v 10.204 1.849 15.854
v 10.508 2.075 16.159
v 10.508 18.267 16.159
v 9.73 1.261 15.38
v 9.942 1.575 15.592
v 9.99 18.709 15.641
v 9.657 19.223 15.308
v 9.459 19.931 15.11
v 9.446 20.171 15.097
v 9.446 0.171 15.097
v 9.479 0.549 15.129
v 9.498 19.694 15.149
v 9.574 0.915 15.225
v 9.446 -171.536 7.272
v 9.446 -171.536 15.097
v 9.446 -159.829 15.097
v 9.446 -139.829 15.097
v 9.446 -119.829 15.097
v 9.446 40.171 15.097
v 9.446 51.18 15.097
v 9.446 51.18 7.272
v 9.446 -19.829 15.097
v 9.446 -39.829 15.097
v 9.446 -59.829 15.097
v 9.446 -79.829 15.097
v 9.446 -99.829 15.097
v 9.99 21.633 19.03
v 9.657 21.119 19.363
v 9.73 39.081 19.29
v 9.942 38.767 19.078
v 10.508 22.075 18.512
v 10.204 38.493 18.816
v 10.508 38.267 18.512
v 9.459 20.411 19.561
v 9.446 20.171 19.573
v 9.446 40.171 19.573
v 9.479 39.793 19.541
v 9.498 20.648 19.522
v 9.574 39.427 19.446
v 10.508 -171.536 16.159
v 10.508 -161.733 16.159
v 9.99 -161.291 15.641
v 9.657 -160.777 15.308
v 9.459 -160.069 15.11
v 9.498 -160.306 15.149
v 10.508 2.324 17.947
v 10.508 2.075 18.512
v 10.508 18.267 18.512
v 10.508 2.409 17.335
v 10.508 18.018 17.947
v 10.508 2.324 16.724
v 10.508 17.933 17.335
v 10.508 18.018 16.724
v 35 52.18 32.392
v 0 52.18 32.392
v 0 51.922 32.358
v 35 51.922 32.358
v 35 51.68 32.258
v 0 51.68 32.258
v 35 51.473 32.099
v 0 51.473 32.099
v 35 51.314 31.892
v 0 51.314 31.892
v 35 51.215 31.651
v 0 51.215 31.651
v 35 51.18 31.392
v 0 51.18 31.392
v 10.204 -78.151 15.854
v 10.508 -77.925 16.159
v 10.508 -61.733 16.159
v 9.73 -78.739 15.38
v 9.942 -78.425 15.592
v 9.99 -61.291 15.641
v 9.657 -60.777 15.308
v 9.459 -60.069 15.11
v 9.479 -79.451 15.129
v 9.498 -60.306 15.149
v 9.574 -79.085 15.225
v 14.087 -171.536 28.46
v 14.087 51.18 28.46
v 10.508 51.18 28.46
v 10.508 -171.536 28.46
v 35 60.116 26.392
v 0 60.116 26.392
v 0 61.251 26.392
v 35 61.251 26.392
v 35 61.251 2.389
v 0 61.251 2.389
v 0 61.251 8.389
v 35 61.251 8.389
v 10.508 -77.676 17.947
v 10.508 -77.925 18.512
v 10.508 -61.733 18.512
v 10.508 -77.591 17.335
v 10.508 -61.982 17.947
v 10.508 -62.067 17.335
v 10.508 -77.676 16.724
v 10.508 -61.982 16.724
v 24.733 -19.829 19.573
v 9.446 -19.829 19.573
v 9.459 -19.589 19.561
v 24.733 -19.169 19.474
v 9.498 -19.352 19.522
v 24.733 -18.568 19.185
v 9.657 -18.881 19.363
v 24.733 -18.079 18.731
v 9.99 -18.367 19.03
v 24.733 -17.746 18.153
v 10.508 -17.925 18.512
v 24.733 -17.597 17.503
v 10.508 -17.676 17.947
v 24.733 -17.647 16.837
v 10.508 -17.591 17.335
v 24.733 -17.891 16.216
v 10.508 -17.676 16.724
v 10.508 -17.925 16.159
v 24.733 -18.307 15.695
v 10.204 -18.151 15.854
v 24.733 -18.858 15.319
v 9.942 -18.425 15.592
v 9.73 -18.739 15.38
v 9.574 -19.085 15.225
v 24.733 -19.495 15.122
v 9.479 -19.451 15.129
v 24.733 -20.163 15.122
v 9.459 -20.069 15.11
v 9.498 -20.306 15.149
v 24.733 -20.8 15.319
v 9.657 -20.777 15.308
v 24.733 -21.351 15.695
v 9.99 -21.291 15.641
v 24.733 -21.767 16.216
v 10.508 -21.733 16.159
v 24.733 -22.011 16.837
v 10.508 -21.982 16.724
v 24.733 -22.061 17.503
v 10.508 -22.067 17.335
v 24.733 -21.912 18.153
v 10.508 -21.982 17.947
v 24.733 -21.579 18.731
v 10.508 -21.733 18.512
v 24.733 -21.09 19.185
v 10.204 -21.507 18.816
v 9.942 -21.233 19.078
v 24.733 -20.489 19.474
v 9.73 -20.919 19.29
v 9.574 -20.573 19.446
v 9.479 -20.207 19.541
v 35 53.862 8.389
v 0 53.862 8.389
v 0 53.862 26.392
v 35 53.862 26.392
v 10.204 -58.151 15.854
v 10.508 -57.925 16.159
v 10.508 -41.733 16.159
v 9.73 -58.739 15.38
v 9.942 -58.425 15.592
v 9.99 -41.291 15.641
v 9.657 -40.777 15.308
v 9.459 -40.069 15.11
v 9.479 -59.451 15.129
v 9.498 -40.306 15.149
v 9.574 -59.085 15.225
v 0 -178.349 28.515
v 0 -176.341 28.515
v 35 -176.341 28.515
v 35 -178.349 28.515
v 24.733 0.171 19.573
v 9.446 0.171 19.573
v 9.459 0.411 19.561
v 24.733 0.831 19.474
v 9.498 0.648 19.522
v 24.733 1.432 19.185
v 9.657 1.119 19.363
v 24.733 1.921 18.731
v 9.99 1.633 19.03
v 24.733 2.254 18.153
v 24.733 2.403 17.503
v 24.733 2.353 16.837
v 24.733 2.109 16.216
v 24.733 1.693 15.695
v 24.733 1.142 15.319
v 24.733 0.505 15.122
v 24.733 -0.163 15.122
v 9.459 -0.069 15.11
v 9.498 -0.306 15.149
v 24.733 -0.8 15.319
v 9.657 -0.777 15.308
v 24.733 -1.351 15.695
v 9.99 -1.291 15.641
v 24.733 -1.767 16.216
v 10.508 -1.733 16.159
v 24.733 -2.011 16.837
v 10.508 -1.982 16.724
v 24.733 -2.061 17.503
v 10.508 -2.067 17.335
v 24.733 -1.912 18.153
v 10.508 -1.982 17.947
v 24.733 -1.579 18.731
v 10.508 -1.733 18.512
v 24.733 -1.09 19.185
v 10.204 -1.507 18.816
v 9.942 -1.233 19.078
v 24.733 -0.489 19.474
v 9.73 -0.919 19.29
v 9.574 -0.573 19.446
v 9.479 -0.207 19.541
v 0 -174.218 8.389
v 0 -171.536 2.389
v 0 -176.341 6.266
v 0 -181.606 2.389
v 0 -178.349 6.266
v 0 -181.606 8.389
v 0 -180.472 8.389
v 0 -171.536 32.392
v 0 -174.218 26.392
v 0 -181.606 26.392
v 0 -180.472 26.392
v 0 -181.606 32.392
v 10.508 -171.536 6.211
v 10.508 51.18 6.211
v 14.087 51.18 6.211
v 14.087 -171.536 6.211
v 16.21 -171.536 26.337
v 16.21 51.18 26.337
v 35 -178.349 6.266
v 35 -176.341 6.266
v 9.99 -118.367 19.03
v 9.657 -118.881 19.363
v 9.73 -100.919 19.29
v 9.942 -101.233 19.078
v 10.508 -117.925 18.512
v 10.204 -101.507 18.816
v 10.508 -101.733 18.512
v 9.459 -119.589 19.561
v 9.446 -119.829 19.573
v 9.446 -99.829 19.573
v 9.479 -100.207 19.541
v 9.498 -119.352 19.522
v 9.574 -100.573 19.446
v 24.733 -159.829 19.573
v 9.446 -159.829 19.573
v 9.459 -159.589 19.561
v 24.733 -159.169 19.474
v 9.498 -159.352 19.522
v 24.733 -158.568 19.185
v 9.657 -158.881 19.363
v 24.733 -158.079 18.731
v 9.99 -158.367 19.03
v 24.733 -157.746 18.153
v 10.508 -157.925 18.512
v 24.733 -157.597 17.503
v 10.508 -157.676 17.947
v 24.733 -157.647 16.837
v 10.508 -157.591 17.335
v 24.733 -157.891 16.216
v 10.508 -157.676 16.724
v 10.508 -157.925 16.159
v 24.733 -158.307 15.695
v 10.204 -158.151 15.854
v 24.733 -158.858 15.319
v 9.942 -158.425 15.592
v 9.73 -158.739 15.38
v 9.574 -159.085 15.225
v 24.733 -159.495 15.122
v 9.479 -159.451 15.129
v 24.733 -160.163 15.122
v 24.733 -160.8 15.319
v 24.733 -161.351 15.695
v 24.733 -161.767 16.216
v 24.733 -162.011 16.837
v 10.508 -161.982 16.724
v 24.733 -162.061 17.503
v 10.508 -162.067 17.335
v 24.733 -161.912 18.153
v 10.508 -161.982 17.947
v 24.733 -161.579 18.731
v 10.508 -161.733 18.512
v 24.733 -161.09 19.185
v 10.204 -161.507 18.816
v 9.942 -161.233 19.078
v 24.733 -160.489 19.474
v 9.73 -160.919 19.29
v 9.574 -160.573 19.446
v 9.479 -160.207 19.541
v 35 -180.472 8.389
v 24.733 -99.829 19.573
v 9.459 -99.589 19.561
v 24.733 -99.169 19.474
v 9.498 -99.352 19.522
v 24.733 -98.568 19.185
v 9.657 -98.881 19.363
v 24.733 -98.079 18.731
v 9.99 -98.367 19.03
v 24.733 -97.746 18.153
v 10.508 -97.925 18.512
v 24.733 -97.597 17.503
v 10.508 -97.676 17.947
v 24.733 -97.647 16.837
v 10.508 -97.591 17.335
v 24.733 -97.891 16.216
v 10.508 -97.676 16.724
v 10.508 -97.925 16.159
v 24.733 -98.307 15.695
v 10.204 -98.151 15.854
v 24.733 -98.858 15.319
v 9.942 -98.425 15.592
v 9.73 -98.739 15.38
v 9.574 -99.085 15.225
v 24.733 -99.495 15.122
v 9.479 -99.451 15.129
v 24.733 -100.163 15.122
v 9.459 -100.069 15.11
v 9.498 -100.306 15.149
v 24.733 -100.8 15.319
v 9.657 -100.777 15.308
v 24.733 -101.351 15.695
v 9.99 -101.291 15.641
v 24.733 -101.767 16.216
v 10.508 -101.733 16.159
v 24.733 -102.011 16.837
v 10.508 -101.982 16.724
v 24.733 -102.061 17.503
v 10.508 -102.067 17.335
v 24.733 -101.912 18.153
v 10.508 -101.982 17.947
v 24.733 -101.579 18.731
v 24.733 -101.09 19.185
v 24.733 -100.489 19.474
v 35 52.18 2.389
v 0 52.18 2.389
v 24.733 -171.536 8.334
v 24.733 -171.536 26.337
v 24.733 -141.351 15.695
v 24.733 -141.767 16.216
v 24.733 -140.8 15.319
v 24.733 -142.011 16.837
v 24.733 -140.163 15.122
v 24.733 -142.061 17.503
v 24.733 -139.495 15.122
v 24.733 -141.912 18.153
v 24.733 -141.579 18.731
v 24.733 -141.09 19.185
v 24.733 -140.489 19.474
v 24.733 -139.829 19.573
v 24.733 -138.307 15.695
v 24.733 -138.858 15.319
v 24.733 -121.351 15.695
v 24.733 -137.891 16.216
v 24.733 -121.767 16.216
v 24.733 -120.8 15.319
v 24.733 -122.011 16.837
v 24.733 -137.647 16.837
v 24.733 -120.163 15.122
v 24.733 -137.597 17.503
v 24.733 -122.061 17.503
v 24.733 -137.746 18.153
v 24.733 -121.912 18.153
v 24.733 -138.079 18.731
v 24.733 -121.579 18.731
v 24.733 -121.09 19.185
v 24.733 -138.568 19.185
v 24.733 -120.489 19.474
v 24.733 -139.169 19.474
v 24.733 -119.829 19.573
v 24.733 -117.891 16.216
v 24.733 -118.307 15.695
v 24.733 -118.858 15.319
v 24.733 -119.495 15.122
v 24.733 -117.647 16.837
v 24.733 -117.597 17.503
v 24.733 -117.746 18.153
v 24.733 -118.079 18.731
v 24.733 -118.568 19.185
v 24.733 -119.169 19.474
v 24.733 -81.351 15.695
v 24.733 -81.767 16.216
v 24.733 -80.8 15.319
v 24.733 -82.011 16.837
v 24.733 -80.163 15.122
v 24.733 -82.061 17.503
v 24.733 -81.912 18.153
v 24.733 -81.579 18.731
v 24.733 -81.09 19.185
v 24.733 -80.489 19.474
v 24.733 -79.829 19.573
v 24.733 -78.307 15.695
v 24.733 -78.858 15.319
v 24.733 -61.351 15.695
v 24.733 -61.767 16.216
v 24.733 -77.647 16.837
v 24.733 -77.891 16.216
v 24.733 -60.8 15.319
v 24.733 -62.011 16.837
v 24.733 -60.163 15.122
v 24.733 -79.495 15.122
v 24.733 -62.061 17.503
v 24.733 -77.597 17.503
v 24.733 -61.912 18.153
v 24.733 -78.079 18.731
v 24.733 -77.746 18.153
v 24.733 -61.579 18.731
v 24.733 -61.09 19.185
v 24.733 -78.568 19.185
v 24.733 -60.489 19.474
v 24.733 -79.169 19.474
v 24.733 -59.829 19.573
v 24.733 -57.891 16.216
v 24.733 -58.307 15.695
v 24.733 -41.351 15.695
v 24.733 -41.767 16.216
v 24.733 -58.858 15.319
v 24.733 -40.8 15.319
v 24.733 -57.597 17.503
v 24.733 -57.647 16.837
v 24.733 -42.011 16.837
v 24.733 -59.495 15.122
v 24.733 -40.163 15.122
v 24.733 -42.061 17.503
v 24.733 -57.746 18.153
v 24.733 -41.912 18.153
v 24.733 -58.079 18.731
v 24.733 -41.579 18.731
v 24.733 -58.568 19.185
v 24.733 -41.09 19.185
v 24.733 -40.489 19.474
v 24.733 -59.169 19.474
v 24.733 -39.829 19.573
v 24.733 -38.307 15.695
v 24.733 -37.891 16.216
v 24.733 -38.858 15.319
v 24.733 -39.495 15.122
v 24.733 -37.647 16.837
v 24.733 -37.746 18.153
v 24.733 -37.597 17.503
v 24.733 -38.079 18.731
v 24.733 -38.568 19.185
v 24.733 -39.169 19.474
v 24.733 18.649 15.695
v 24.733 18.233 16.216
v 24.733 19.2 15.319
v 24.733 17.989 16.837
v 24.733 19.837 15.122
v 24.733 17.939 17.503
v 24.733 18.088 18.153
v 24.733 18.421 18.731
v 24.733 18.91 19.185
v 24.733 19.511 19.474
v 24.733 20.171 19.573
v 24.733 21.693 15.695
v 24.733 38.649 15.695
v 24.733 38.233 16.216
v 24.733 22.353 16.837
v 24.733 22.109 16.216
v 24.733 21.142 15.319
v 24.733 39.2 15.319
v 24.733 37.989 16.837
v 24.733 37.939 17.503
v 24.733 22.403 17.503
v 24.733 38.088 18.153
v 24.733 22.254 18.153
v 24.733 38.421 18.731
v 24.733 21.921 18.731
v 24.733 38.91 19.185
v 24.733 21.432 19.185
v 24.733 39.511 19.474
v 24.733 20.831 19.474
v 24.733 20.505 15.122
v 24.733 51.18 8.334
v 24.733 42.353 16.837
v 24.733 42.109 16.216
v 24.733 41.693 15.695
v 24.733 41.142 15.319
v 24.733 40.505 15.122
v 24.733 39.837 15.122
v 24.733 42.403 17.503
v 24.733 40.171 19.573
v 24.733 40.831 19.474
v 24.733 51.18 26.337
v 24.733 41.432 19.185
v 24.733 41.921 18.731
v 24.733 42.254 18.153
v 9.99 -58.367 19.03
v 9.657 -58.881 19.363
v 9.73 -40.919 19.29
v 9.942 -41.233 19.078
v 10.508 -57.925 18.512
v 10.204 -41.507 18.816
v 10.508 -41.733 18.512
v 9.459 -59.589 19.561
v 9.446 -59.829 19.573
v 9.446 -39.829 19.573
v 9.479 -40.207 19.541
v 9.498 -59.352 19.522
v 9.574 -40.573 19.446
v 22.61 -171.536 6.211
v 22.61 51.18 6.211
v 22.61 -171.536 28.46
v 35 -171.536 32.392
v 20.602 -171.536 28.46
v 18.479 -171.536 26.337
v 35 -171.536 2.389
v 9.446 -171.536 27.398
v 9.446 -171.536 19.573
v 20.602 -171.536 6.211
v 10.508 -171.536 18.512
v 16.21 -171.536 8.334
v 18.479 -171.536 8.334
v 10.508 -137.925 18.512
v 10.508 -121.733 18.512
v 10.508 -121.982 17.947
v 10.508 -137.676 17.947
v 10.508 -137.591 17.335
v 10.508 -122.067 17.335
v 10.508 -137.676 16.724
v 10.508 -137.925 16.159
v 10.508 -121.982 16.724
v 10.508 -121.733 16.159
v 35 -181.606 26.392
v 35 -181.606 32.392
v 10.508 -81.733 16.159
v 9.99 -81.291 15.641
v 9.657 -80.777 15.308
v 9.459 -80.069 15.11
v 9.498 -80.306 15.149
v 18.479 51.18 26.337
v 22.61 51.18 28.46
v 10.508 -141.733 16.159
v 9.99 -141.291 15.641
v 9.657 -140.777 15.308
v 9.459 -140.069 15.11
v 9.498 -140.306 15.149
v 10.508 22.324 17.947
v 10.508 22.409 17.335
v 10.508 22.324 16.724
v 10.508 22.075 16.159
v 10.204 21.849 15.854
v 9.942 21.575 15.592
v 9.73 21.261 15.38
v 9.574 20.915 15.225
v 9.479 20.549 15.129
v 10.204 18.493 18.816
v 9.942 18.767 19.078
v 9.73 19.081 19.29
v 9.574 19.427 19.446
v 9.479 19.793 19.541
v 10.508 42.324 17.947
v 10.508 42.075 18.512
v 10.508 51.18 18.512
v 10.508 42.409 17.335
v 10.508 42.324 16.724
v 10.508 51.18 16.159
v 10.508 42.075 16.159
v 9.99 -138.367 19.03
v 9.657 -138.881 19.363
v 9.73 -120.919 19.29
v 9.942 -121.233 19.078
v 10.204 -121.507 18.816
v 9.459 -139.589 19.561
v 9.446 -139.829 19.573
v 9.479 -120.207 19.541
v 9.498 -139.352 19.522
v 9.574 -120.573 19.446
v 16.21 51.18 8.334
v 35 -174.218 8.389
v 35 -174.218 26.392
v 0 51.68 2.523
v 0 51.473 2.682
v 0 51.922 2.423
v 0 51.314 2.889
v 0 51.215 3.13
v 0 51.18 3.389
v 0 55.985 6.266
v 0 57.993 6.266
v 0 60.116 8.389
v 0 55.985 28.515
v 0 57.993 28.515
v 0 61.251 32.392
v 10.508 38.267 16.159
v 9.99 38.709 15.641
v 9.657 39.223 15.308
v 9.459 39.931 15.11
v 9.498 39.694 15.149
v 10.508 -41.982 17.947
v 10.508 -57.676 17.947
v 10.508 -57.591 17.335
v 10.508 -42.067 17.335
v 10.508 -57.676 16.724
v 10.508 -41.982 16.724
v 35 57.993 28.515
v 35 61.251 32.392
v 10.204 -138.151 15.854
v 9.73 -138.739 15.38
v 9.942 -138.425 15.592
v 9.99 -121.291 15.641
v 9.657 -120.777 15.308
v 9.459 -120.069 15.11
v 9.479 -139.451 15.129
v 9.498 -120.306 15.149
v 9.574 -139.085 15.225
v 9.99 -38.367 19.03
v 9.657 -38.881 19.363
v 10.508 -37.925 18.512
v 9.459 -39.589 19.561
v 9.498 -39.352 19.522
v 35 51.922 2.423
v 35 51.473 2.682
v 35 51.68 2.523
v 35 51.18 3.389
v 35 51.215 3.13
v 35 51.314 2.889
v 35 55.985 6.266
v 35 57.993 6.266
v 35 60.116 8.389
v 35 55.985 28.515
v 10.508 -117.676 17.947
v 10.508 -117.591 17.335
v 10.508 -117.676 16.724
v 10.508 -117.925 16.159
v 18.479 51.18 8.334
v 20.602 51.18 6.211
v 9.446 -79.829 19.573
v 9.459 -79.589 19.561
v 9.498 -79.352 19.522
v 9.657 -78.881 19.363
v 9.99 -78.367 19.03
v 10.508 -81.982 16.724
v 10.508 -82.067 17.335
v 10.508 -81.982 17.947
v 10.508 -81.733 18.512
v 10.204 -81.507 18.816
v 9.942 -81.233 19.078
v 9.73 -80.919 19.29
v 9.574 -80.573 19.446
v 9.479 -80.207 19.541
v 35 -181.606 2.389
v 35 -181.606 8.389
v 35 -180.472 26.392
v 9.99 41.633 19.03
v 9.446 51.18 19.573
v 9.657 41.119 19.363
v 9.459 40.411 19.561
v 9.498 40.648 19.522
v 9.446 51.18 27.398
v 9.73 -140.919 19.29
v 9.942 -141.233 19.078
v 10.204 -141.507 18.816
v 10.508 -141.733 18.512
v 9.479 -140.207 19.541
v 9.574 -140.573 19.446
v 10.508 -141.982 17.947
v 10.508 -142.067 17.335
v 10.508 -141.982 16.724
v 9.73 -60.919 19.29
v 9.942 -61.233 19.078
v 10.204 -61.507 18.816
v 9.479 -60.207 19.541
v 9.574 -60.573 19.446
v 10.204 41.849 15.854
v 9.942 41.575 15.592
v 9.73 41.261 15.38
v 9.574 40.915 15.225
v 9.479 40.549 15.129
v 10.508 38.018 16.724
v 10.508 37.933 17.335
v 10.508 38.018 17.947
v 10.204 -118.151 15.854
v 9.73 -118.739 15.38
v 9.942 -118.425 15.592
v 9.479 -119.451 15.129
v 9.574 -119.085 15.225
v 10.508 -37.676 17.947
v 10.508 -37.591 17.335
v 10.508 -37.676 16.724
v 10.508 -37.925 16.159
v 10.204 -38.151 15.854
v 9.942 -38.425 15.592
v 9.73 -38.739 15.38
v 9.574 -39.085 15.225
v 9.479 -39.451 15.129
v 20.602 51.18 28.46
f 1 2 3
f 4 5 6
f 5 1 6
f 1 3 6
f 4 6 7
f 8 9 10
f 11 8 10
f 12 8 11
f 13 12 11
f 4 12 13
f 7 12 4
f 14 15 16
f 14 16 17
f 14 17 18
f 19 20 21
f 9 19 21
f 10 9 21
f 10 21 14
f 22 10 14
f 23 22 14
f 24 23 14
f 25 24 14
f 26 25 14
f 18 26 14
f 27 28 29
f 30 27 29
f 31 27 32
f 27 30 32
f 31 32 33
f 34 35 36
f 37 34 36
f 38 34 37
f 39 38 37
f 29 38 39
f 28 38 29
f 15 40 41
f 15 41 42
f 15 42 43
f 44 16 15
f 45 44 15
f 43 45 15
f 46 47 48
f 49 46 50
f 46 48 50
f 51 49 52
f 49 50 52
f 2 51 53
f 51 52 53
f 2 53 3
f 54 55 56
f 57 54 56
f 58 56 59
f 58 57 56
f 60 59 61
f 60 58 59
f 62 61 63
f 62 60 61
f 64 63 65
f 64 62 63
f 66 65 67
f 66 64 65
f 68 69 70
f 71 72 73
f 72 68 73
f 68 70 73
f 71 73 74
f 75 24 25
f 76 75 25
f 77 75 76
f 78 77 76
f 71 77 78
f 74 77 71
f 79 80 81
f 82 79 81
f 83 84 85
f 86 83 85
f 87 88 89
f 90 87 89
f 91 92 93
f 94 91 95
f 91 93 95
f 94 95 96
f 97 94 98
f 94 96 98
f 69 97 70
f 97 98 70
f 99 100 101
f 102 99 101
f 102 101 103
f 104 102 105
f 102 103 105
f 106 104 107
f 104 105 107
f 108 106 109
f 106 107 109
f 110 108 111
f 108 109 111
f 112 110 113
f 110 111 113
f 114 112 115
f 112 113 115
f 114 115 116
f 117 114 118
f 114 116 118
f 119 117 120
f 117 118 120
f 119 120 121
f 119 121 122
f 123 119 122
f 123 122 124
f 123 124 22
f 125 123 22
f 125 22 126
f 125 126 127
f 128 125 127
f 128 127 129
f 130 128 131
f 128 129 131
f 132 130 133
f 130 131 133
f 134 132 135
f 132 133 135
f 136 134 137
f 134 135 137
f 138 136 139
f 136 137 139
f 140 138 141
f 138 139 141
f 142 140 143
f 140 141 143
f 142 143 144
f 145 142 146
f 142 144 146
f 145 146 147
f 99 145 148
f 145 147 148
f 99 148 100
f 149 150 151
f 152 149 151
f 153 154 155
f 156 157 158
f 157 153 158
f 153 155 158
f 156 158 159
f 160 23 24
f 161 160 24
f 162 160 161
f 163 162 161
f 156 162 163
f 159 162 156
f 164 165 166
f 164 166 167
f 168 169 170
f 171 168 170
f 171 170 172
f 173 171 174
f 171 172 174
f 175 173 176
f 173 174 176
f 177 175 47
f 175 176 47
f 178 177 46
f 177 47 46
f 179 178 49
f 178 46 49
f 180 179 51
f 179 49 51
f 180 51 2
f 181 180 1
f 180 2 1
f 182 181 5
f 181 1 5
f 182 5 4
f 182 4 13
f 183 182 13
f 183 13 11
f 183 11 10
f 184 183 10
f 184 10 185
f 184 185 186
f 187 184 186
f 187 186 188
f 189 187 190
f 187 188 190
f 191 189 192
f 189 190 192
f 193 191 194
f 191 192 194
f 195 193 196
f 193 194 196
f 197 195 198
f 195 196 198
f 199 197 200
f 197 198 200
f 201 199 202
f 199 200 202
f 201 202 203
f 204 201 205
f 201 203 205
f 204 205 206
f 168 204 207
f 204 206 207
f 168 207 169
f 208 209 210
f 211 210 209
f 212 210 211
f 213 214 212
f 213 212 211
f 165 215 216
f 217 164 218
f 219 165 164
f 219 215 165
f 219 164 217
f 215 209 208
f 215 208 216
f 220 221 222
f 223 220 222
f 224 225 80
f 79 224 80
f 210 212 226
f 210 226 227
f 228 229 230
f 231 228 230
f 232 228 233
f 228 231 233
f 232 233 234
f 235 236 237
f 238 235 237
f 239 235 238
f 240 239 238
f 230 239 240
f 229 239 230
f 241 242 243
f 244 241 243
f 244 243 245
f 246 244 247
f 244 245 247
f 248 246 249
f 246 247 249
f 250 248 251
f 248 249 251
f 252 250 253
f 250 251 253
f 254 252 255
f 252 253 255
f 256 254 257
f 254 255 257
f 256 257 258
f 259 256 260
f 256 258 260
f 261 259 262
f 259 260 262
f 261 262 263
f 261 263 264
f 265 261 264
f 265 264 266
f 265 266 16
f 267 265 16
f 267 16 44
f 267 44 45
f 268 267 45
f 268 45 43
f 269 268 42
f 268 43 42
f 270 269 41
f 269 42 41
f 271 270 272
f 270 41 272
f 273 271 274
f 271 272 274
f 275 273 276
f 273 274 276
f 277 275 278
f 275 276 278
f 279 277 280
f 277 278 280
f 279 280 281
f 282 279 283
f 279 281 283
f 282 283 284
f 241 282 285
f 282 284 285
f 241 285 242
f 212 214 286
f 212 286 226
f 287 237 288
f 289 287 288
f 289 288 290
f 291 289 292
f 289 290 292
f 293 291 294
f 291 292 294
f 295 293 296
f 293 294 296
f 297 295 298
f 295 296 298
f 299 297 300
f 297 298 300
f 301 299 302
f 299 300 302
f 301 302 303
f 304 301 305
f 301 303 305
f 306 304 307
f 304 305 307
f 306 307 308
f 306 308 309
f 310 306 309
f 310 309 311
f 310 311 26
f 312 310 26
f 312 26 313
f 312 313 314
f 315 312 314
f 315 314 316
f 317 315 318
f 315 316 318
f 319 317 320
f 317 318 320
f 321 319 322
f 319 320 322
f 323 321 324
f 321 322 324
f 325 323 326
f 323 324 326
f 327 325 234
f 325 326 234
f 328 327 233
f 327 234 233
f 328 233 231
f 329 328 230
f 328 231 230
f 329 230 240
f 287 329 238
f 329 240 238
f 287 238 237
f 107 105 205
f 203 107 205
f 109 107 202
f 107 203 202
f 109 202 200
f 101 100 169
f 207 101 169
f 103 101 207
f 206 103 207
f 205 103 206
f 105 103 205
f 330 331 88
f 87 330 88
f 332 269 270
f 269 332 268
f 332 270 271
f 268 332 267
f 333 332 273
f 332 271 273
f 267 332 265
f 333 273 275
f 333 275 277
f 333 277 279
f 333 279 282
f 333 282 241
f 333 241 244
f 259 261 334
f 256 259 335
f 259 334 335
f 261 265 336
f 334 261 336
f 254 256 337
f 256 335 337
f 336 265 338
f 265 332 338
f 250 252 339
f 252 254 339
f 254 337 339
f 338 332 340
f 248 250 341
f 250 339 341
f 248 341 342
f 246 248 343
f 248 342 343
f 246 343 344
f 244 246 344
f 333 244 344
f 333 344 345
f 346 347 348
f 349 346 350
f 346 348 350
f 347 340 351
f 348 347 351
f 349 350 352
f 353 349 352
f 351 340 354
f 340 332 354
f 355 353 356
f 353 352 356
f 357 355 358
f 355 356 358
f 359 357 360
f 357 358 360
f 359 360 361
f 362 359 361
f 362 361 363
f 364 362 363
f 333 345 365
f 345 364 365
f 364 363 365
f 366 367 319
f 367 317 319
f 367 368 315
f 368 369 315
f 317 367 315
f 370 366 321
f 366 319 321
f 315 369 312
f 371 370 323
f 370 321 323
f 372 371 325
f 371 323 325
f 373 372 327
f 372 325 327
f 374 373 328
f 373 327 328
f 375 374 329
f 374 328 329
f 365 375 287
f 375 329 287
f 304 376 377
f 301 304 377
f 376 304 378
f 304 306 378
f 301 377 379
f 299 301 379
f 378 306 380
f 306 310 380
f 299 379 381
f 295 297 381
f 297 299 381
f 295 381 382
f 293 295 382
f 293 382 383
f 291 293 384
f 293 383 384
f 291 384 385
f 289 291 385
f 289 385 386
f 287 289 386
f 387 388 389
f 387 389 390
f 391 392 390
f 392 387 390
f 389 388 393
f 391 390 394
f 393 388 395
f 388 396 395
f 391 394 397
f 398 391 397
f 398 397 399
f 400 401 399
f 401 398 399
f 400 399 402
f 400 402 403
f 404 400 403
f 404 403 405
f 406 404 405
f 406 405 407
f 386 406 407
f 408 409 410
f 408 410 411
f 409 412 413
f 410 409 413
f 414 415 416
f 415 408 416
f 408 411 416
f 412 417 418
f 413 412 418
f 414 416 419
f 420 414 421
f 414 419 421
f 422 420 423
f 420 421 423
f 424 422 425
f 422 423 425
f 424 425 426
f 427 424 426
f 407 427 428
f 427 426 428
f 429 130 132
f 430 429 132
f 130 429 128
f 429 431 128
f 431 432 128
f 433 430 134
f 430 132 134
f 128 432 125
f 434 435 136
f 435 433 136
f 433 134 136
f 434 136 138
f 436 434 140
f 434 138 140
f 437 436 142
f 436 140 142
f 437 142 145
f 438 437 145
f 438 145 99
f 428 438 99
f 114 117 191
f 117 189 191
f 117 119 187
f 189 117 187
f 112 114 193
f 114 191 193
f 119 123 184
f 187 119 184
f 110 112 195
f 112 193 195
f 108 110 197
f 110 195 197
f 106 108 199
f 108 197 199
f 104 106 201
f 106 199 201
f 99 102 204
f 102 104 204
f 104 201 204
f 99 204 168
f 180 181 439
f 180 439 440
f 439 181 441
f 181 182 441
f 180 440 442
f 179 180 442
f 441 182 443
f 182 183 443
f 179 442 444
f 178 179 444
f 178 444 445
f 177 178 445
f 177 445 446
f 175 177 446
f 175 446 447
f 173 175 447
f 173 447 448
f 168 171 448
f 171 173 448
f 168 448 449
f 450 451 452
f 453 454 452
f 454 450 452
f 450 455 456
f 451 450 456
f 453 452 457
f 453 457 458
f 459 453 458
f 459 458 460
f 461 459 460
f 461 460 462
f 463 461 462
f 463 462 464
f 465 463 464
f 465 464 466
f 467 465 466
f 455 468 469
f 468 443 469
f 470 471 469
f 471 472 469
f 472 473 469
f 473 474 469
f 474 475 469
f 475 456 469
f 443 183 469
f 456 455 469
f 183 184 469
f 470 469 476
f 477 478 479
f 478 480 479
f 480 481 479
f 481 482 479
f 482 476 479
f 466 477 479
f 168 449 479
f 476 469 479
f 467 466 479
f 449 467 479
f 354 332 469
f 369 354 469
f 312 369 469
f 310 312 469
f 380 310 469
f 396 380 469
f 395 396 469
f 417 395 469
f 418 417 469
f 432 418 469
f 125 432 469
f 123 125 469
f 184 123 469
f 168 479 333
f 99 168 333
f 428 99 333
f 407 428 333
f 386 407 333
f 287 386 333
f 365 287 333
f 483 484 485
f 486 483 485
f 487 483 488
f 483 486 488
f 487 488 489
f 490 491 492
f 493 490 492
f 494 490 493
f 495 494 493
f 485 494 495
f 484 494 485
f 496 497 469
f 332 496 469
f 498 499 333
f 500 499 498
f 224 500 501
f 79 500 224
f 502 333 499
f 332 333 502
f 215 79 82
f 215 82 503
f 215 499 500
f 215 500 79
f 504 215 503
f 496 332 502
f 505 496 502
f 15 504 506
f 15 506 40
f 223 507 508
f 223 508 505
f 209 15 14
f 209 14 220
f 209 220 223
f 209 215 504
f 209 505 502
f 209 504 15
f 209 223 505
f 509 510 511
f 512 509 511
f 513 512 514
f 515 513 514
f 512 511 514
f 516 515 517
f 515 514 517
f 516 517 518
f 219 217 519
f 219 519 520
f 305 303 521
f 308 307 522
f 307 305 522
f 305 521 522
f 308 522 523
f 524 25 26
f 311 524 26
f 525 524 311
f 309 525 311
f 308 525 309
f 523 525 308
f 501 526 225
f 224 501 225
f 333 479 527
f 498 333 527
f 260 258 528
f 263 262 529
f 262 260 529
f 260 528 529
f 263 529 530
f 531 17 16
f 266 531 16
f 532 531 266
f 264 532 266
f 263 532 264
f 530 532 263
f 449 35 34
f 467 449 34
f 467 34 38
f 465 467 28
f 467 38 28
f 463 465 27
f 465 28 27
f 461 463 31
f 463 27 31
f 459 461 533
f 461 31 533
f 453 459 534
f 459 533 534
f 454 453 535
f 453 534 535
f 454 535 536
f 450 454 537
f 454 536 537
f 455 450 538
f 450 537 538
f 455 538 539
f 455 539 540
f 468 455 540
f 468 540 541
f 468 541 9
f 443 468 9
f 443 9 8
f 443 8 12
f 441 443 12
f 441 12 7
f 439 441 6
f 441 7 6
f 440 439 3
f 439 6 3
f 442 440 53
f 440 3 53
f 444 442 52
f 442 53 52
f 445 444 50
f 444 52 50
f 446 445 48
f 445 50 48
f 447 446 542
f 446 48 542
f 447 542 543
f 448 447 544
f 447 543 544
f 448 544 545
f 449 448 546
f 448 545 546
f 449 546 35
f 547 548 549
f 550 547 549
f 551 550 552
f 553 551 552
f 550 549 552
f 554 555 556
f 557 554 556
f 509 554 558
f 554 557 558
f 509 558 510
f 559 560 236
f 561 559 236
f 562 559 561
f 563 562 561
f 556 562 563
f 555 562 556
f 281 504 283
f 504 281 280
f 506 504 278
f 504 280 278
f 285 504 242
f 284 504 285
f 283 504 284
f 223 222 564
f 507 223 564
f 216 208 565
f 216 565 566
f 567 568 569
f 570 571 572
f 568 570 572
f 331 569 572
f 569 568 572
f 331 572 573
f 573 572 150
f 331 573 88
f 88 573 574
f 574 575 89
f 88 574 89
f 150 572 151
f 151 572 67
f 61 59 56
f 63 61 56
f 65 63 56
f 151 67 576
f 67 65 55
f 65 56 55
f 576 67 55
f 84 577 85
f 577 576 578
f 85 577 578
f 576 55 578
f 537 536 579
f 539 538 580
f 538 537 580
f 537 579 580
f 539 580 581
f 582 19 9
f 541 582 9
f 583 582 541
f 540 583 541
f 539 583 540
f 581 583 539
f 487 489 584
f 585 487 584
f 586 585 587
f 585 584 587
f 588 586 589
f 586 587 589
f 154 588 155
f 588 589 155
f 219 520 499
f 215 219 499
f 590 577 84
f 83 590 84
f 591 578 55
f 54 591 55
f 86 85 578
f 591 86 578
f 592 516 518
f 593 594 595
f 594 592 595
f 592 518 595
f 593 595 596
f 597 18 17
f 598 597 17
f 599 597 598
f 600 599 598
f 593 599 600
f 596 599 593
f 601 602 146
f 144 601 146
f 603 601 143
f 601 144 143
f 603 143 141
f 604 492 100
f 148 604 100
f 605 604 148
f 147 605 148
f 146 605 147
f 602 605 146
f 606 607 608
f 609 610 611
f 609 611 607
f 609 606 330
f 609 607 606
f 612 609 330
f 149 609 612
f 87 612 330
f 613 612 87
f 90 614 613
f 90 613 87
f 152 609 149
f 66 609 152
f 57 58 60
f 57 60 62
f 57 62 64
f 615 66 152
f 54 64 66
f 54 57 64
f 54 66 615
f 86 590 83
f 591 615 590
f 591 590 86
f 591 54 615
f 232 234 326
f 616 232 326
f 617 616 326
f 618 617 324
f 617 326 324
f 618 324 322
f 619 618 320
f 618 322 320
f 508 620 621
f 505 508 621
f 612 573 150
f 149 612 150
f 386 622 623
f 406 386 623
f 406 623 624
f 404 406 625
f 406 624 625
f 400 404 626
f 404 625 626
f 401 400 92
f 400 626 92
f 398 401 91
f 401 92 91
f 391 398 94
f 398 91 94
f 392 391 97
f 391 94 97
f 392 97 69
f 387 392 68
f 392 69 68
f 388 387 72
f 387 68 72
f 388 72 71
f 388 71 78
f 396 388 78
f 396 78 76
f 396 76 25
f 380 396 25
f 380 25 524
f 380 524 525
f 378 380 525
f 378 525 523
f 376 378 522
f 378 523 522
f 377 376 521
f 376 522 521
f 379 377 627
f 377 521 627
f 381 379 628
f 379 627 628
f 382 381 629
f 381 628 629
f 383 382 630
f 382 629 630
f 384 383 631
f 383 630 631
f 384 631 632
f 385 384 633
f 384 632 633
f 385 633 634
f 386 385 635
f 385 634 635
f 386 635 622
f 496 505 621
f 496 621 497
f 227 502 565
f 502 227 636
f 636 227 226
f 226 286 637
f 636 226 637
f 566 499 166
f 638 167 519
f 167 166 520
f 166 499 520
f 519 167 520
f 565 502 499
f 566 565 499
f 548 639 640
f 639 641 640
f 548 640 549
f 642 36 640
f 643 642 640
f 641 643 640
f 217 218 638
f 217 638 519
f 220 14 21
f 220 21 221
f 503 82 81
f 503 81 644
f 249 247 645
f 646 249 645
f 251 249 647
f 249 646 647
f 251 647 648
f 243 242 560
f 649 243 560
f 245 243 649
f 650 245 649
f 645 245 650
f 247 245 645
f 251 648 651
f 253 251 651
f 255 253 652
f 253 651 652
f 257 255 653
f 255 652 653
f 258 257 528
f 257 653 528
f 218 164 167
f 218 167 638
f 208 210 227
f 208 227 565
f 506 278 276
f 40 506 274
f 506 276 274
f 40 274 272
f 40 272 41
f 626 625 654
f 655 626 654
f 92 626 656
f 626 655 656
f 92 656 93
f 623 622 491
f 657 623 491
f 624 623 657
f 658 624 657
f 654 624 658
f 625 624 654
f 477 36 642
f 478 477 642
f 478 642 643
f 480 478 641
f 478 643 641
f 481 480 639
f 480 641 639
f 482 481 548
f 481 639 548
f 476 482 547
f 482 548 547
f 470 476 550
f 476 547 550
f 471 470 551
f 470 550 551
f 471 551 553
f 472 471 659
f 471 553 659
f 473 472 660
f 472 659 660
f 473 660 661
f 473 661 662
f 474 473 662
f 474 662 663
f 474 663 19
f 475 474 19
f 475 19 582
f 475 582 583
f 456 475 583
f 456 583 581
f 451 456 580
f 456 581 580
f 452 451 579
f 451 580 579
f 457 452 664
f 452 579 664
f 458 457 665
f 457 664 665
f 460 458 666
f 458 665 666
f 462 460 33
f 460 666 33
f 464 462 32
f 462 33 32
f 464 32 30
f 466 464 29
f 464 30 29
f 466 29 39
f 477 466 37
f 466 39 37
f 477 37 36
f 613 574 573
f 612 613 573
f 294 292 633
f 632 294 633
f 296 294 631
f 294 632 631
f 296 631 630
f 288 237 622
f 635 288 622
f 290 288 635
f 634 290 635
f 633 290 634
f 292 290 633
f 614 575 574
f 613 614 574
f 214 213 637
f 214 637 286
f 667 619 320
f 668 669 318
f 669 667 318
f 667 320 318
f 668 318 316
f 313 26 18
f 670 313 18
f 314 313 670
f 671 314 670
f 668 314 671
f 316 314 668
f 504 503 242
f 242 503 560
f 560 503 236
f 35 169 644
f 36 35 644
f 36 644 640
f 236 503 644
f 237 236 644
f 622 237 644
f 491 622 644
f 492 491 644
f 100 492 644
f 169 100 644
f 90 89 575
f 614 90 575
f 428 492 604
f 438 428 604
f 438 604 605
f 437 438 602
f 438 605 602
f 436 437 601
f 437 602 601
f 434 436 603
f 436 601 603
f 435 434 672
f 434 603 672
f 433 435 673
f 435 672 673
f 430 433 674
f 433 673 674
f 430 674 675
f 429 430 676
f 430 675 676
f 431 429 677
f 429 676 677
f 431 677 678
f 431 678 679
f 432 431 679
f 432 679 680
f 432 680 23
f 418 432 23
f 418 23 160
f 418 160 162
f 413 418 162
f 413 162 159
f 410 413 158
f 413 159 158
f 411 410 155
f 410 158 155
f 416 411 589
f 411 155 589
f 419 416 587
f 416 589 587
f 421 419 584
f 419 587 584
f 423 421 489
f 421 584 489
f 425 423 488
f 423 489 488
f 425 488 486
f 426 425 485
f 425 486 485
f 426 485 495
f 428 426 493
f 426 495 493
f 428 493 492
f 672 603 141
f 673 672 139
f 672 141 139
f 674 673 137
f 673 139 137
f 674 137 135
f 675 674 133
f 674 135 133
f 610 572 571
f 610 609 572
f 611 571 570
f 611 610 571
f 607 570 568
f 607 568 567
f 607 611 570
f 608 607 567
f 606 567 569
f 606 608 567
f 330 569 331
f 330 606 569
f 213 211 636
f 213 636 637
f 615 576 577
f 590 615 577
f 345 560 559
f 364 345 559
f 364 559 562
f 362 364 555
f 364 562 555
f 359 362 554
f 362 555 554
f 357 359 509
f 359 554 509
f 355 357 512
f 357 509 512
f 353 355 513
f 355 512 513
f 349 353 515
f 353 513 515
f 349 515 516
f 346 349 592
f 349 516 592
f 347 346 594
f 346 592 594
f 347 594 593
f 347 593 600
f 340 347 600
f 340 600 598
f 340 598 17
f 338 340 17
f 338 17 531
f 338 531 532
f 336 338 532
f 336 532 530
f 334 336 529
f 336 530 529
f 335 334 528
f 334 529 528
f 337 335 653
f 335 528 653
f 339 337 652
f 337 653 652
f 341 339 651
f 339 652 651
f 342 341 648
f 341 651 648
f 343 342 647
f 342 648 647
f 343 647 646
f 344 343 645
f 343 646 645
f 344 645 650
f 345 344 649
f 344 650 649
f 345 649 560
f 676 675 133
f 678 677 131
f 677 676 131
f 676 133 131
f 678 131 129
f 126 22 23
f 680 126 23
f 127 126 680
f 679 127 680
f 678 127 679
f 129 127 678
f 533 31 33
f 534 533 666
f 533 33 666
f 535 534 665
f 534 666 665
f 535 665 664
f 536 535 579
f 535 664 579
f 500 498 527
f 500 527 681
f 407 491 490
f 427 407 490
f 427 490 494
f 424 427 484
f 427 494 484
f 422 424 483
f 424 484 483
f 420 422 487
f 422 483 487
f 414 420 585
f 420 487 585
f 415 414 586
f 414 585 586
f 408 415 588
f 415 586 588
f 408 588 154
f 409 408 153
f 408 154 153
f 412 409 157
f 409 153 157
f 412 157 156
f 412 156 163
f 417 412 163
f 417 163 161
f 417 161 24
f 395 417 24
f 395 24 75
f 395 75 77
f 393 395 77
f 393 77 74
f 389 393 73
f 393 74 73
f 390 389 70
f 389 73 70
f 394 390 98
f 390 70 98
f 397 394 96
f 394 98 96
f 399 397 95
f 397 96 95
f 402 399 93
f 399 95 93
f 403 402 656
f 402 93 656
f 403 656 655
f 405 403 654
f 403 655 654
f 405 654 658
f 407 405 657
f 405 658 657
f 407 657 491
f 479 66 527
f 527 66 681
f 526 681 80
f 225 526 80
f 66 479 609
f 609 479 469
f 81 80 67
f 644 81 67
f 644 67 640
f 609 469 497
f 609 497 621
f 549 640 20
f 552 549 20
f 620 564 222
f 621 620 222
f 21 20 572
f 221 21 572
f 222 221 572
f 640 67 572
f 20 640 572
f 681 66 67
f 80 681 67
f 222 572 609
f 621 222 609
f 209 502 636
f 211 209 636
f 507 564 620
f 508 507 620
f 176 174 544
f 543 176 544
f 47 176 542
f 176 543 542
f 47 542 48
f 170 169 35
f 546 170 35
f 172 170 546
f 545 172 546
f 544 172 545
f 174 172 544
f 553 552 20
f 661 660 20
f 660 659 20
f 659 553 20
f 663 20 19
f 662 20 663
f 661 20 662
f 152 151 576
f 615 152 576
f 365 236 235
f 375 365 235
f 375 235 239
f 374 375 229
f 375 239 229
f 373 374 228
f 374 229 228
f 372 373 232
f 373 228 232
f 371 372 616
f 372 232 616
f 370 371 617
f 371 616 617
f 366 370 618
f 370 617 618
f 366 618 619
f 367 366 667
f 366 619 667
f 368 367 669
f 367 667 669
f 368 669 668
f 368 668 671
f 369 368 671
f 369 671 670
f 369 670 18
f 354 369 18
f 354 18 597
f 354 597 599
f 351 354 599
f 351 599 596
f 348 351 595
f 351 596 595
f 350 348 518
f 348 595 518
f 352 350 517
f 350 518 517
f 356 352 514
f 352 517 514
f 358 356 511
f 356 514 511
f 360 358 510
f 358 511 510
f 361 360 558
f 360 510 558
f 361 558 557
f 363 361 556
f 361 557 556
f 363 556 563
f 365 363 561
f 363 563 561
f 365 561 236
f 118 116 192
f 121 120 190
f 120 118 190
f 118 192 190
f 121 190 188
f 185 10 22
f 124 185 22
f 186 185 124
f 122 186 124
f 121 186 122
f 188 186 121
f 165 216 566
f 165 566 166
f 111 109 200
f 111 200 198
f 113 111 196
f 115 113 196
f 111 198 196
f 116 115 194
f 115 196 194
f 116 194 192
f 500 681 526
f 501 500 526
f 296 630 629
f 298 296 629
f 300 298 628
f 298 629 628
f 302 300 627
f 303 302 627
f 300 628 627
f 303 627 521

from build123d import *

# Parameters (mm, degrees)
BOSS_EXTRUDE1_DEPTH = 35
FILLET1_R           = 1
BOSS_EXTRUDE2_DEPTH = 222.716603748
SKETCH6_R           = 2.238154979
CUT_EXTRUDE1_DEPTH  = 15.286677324


with BuildPart() as part:
    # Sketch1 → Boss-Extrude1 (new body)
    with BuildSketch(Plane.YZ):
        Polygon((60.116092999, 26.392150669), (61.250815122, 26.392150669), (61.250815122, 32.392150669), (51.18048308, 32.392150669), (51.18048308, 2.389198142), (61.250815122, 2.389198142), (61.250815122, 8.389198142), (60.116092999, 8.389198142), (57.992886952, 6.265992095), (55.985387253, 6.265992095), (53.862181206, 8.389198142), (53.862181206, 26.392150669), (55.985387253, 28.515356716), (57.992886952, 28.515356716), align=None)
    extrude(amount=BOSS_EXTRUDE1_DEPTH)


with BuildPart() as body_2:
    # Mirror4: mirrored copy
    add(part.part.mirror(Plane.ZX.offset(-60.177818794)))


with BuildPart() as part_1:
    add(part.part)

    # Fillet1
    fillet1_edges = [part_1.edges().sort_by_distance(p)[0] for p in [
        (17.5, 51.18048308, 2.389198142),
        (17.5, 51.18048308, 32.392150669),
    ]]
    fillet(fillet1_edges, radius=FILLET1_R)

    add(body_2.part)  # Boss-Extrude2 merges body 2
    # Sketch3 → Boss-Extrude2 (add)
    with BuildSketch(Plane.XZ.offset(-51.18048308)):
        Polygon((24.733095029, 8.333793818), (24.733095029, 26.336746345), (22.609888982, 28.459952392), (20.602389284, 28.459952392), (18.479183237, 26.336746345), (16.20973899, 26.336746345), (14.086532943, 28.459952392), (10.508020729, 28.459952392), (9.446417705, 27.398349369), (9.446417705, 19.57342506), (10.508020729, 18.511822037), (10.508020729, 16.158718126), (9.446417705, 15.097115103), (9.446417705, 7.272190794), (10.508020729, 6.210587771), (14.086532943, 6.210587771), (16.20973899, 8.333793818), (18.479183237, 8.333793818), (20.602389284, 6.210587771), (22.609888982, 6.210587771), align=None)
    extrude(amount=BOSS_EXTRUDE2_DEPTH)

    # Sketch6 → Cut-Extrude1 (cut)
    with BuildSketch(Plane(origin=(9.446417705, 0, 0), x_dir=(0, -1, 0), z_dir=(-1, 0, 0))):
        with Locations(Location((159.829006886, 17.335270082, 0), (0, 0, 90))):
            Circle(SKETCH6_R)
        with Locations(Location((139.829006886, 17.335270082, 0), (0, 0, 90))):
            Circle(SKETCH6_R)
        with Locations(Location((119.829006886, 17.335270082, 0), (0, 0, 90))):
            Circle(SKETCH6_R)
        with Locations(Location((99.829006886, 17.335270082, 0), (0, 0, 90))):
            Circle(SKETCH6_R)
        with Locations(Location((79.829006886, 17.335270082, 0), (0, 0, 90))):
            Circle(SKETCH6_R)
        with Locations(Location((59.829006886, 17.335270082, 0), (0, 0, 90))):
            Circle(SKETCH6_R)
        with Locations(Location((39.829006886, 17.335270082, 0), (0, 0, 90))):
            Circle(SKETCH6_R)
        with Locations(Location((19.829006886, 17.335270082, 0), (0, 0, 90))):
            Circle(SKETCH6_R)
        with Locations(Location((-0.170993114, 17.335270082, 0), (0, 0, 90))):
            Circle(SKETCH6_R)
        with Locations(Location((-20.170993114, 17.335270082, 0), (0, 0, 90))):
            Circle(SKETCH6_R)
        with Locations(Location((-40.170993114, 17.335270082, 0), (0, 0, 90))):
            Circle(SKETCH6_R)
    extrude(amount=-CUT_EXTRUDE1_DEPTH, mode=Mode.SUBTRACT)


solid = part_1.part
